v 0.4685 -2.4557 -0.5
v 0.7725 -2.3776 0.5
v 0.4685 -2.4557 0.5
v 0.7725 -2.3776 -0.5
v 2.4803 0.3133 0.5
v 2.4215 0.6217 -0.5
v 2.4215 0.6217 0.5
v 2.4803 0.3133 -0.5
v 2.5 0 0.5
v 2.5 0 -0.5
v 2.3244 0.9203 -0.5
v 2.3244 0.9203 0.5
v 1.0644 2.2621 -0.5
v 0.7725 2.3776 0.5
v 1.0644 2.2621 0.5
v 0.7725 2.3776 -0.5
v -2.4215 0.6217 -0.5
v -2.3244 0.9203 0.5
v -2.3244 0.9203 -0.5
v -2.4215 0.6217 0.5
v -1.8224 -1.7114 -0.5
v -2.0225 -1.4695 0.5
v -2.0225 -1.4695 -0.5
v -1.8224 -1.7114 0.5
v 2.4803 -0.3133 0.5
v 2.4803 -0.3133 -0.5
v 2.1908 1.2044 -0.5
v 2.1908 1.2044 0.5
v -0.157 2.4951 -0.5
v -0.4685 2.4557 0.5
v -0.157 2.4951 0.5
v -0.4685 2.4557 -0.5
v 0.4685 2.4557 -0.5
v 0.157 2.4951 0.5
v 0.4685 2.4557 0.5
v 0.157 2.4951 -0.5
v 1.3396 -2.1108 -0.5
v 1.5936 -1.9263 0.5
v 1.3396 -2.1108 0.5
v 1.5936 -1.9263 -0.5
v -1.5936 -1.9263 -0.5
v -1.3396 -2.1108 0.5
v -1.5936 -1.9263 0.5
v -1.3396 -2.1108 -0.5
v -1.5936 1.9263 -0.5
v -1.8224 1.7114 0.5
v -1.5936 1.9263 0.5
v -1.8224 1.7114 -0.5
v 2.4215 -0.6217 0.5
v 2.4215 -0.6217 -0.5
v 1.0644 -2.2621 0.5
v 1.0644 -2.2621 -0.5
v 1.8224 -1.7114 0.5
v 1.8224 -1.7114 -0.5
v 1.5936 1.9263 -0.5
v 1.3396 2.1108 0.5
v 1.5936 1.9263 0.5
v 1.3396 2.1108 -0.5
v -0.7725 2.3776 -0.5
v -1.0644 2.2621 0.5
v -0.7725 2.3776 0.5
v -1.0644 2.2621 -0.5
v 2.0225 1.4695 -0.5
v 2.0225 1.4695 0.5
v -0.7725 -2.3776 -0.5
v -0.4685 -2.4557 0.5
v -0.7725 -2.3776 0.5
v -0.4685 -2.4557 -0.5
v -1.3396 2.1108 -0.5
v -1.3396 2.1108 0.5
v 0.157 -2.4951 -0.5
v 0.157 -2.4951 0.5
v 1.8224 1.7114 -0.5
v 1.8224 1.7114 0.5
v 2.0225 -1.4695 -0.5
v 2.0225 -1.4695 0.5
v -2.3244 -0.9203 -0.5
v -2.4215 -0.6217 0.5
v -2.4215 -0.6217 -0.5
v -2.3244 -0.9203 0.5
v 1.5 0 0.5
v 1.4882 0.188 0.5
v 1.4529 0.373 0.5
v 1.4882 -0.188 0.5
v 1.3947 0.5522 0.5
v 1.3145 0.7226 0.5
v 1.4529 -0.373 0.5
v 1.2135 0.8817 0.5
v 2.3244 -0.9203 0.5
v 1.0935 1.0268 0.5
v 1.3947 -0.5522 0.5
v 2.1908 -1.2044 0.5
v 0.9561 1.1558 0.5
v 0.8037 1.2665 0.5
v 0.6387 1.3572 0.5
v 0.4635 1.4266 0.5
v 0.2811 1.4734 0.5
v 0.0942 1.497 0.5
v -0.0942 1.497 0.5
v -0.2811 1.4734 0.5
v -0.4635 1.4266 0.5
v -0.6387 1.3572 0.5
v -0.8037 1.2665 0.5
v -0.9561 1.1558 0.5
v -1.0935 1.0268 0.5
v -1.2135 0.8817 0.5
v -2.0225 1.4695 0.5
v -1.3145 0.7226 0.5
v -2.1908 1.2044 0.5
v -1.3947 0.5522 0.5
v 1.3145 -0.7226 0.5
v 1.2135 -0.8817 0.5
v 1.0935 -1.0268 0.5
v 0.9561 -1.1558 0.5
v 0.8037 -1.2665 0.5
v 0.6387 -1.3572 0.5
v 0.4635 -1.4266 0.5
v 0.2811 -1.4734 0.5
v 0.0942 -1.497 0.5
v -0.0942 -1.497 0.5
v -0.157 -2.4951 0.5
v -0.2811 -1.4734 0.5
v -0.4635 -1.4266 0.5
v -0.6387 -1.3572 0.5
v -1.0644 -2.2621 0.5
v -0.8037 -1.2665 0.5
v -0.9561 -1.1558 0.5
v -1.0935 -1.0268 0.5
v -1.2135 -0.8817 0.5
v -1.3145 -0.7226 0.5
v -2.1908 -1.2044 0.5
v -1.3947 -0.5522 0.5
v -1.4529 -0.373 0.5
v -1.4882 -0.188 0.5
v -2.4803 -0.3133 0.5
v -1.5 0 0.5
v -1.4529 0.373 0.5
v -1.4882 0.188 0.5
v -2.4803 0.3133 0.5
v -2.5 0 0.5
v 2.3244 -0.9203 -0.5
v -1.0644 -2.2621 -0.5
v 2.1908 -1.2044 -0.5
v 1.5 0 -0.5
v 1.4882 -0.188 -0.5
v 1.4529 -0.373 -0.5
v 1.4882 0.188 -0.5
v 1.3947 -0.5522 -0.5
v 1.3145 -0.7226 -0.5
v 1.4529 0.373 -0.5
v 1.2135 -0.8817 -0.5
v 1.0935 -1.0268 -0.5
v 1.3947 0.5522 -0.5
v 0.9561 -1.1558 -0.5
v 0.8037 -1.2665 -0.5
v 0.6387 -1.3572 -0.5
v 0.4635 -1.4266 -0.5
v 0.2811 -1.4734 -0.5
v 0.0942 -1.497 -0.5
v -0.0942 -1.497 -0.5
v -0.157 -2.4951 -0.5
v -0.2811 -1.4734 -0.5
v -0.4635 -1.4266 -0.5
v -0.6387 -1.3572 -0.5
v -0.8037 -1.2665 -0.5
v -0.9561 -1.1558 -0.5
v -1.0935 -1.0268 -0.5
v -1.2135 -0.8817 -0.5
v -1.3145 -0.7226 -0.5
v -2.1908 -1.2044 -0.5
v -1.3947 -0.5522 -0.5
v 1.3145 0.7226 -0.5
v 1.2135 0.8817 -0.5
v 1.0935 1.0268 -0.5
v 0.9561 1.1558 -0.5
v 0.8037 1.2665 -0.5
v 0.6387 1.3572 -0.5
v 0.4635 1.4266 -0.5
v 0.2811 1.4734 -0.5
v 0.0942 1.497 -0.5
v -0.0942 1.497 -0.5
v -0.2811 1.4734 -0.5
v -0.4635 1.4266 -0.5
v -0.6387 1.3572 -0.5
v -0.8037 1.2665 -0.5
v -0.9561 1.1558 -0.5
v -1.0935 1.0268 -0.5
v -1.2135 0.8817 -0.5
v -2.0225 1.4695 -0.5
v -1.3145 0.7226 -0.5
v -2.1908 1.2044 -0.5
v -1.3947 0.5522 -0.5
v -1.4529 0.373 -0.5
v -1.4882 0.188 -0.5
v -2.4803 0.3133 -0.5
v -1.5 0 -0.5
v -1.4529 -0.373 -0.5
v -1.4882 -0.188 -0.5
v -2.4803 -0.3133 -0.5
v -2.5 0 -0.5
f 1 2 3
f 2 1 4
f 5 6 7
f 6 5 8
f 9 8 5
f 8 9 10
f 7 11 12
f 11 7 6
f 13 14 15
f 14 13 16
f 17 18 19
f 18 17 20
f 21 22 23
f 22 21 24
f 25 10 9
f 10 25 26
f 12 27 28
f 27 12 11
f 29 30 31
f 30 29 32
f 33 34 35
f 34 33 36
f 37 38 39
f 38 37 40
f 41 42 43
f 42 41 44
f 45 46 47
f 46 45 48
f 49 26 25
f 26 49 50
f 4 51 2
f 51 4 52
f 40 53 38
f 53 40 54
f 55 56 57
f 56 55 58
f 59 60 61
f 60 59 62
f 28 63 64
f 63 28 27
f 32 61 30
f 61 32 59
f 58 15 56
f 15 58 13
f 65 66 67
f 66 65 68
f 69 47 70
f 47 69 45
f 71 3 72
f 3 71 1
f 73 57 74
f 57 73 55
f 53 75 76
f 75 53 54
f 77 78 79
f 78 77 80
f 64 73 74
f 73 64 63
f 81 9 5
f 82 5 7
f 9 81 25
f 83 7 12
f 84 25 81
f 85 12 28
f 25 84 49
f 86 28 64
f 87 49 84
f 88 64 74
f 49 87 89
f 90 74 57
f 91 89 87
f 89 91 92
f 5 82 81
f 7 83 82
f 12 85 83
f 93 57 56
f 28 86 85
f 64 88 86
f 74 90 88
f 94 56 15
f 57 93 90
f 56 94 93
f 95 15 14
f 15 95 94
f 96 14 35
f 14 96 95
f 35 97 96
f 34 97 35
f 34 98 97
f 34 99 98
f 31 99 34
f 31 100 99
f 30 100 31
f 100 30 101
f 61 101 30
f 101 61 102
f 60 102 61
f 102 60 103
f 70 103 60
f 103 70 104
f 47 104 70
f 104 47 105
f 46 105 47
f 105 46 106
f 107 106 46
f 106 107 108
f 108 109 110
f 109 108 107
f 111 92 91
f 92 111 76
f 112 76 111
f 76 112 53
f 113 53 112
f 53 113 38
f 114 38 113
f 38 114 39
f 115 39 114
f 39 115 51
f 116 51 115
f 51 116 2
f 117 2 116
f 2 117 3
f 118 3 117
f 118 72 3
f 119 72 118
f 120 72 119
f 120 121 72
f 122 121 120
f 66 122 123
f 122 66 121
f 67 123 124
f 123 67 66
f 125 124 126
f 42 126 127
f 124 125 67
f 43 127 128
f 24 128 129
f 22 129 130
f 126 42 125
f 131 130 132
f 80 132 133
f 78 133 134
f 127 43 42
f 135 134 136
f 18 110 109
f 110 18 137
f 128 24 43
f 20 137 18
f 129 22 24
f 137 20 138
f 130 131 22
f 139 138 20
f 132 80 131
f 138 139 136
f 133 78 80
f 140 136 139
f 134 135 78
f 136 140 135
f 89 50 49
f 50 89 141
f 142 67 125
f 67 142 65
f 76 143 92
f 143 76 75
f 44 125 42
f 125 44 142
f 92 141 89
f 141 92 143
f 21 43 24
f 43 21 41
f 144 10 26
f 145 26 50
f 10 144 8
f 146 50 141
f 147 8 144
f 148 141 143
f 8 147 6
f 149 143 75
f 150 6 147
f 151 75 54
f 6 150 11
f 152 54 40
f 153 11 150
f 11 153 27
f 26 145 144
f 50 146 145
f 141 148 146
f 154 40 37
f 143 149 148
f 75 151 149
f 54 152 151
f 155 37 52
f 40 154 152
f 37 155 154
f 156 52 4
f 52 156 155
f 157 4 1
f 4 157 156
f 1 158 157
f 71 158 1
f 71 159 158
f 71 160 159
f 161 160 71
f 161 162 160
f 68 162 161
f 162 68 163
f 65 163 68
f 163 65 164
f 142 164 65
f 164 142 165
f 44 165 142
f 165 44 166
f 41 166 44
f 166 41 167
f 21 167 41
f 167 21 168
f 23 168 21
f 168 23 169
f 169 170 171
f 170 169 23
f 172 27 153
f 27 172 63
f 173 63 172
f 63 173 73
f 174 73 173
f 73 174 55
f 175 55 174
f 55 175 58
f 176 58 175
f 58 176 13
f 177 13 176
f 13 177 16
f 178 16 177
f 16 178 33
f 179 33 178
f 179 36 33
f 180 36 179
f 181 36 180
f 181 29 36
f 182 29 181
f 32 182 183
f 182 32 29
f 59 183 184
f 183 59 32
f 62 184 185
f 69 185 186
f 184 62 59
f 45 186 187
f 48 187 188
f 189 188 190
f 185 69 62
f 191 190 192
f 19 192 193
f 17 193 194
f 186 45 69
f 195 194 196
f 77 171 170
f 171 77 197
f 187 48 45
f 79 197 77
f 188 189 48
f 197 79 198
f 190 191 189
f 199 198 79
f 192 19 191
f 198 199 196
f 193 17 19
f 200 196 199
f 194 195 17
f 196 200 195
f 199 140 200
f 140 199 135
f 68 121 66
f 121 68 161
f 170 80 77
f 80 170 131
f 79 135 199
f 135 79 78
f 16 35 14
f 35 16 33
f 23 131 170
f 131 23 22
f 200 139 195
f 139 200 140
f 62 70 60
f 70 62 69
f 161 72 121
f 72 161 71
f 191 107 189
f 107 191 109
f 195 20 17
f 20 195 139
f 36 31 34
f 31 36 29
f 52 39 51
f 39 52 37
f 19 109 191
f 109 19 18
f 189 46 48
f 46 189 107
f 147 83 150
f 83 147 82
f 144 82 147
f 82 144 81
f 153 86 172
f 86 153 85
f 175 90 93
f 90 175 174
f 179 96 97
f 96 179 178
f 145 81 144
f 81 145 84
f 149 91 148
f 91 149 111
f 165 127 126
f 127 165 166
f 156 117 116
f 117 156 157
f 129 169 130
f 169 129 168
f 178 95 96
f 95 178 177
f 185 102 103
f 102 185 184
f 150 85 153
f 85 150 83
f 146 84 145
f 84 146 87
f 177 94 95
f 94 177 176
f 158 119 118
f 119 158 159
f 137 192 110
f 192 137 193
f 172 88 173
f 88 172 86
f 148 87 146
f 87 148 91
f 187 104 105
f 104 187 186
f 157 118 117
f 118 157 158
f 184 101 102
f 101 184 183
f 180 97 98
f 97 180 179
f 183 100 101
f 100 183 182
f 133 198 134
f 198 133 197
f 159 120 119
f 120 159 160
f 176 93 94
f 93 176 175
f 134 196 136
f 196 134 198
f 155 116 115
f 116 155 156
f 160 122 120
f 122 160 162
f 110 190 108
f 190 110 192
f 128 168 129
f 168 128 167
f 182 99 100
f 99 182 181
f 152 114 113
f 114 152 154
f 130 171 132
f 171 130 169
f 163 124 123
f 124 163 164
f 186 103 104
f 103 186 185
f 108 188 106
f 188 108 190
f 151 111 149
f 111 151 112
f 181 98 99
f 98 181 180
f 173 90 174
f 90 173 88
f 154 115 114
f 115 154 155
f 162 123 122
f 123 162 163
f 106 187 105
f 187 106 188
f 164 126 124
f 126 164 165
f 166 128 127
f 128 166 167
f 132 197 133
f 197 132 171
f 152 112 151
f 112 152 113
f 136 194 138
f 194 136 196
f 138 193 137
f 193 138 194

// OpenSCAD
$fn=50;
difference() {
cylinder(h = 1, d = 5, center = true);
cylinder(h = 1.2, d = 3, center = true);
}
